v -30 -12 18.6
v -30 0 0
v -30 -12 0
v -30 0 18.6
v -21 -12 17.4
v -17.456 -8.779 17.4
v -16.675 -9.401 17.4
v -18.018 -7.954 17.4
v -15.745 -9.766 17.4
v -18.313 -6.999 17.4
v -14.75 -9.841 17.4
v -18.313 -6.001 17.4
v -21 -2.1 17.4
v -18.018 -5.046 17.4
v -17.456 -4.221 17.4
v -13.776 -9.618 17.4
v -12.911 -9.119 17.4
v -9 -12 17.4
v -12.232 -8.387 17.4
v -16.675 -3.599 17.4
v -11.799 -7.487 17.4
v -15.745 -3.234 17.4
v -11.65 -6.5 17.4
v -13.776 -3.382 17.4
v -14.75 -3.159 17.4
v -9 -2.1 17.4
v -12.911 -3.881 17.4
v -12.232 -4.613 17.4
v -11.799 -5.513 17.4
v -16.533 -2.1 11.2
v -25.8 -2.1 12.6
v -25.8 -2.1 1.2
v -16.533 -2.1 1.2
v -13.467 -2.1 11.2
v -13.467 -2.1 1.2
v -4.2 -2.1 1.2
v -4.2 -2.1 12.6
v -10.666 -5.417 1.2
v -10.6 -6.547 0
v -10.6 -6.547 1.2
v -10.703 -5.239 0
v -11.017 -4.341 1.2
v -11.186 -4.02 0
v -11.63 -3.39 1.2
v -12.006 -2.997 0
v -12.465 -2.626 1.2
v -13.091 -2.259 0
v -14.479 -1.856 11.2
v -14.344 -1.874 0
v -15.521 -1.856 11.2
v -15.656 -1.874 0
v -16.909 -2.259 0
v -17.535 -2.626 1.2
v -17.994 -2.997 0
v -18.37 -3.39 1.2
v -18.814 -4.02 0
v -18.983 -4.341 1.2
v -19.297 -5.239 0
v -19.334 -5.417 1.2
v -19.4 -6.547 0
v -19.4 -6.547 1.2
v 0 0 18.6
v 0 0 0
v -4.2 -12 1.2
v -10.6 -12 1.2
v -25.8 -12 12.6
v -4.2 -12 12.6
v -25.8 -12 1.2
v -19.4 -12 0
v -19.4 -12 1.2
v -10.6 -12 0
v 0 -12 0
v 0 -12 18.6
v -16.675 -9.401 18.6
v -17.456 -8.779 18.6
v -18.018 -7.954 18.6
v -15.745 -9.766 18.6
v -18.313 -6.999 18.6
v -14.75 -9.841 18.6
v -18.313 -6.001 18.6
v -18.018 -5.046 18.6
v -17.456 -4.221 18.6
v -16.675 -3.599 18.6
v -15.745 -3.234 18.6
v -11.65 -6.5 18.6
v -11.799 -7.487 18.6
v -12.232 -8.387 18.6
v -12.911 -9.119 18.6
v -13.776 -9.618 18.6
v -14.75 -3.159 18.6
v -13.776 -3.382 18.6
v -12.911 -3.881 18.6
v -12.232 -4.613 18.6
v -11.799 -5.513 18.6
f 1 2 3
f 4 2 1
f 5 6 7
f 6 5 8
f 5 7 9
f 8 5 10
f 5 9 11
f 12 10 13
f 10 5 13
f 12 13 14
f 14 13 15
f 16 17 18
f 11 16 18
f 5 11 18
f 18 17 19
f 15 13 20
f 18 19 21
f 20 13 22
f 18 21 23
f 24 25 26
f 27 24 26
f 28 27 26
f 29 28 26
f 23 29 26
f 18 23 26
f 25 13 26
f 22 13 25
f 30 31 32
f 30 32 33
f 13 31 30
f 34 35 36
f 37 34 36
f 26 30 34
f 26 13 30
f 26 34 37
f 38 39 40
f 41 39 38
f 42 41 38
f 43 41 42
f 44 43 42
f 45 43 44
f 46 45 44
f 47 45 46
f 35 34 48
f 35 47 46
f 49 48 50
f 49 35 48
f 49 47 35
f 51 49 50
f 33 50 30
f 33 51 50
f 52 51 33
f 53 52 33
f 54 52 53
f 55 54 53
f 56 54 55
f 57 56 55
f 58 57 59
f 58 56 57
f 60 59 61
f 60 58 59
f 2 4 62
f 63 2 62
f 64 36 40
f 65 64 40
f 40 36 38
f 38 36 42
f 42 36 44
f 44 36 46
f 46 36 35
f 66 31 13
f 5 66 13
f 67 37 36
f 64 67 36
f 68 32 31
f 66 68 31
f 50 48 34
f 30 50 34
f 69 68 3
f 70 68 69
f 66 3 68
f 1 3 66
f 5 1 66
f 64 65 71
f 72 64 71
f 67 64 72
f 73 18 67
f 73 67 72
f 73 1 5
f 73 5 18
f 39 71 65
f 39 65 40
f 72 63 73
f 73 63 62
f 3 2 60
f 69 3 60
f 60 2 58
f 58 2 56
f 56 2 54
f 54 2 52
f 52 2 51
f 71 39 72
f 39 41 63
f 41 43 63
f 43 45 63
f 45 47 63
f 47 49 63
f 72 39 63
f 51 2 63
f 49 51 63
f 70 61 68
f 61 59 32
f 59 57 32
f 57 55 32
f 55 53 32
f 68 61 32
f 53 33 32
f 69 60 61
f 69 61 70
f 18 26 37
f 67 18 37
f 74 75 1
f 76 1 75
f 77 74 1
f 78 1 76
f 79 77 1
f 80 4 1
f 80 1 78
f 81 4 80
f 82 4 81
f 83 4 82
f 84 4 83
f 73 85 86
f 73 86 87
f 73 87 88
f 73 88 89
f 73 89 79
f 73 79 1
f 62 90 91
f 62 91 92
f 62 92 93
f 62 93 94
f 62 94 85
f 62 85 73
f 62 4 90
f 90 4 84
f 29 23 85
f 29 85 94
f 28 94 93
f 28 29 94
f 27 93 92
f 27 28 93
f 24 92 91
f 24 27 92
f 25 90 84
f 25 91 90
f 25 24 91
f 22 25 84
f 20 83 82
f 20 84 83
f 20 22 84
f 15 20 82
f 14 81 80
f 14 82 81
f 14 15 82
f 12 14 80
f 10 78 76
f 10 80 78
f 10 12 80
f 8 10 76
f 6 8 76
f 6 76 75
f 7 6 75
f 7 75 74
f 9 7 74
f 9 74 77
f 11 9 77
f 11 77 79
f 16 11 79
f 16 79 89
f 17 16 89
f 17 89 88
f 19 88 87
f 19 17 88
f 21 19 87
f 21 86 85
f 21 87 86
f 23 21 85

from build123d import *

# Parameters (mm, degrees)
F0_W     = 30
F0_H     = 18.6
F1_DEPTH = 12
F3_START = 7.4
F2_R     = 3.35
F3_DEPTH = 27.8
F4_DEPTH = 2.1
F5_DEPTH = 11.2


with BuildPart() as f1:
    # F0 (on Front) → F1 (new body)
    with BuildSketch(Plane.XZ):
        with Locations((-15, 9.3)):
            Rectangle(F0_W, F0_H)
        Polygon((-21, 17.4), (-15, 17.4), (-9, 17.4), (-4.2, 17.4), (-4.2, 12.6), (-4.2, 9.3), (-4.2, 1.2), (-15, 1.2), (-25.8, 1.2), (-25.8, 9.3), (-25.8, 12.6), (-25.8, 17.4), align=None, mode=Mode.SUBTRACT)
        Polygon((-25.8, 12.6), (-21, 17.4), (-25.8, 17.4), align=None)
        Polygon((-4.2, 17.4), (-9, 17.4), (-4.2, 12.6), align=None)
    extrude(amount=F1_DEPTH)

    # F2 (on Top) → F3 (cut)
    with BuildSketch(Plane.XY.offset(F3_START)):
        with Locations((-15, -6.5)):
            Circle(F2_R)
    extrude(amount=F3_DEPTH, mode=Mode.SUBTRACT)

    # F0 (on Front) → F4 (join)
    with BuildSketch(Plane.XZ):
        Polygon((-9, 17.4), (-15, 17.4), (-21, 17.4), (-25.8, 12.6), (-25.8, 9.3), (-25.8, 1.2), (-15, 1.2), (-4.2, 1.2), (-4.2, 9.3), (-4.2, 12.6), align=None)
    extrude(amount=F4_DEPTH)

    # F2 (on Top) → F5 (cut)
    with BuildSketch(Plane.XY):
        with BuildLine():
            Line((-19.3997538172, -14.9291978362), (-18.3492293667, -15.2891640001))
            Line((-18.3492293667, -15.2891640001), (-15, -14.3958181143))
            Line((-15, -14.3958181143), (-11.6507706333, -15.2891640001))
            Line((-11.6507706333, -15.2891640001), (-10.6002461828, -14.9291978362))
            Line((-10.6002461828, -14.9291978362), (-10.6002461828, -6.5465440438))
            ThreePointArc((-10.6002461828, -6.5465440438), (-15, -10.9), (-19.3997538172, -6.5465440438))
            Line((-19.3997538172, -6.5465440438), (-19.3997538172, -14.9291978362))
        make_face()
        with BuildLine():
            ThreePointArc((-10.6002461828, -6.5465440438), (-15, -1.8248851289), (-19.3997538172, -6.5465440438))
            ThreePointArc((-19.3997538172, -6.5465440438), (-15.0232723474, -2.1000615461), (-10.6, -6.5))
            ThreePointArc((-10.6, -6.5), (-10.6000615461, -6.5232723474), (-10.6002461828, -6.5465440438))
        make_face()
        with BuildLine():
            ThreePointArc((-10.6, -6.5), (-15.0232723474, -2.1000615461), (-19.3997538172, -6.5465440438))
            ThreePointArc((-19.3997538172, -6.5465440438), (-15, -10.9), (-10.6002461828, -6.5465440438))
            ThreePointArc((-10.6002461828, -6.5465440438), (-10.6000615461, -6.5232723474), (-10.6, -6.5))
        make_face()
        with Locations((-15, -6.5)):
            Circle(F2_R, mode=Mode.SUBTRACT)
        with Locations((-15, -6.5)):
            Circle(F2_R)
    extrude(amount=F5_DEPTH, mode=Mode.SUBTRACT)


solid = f1.part
